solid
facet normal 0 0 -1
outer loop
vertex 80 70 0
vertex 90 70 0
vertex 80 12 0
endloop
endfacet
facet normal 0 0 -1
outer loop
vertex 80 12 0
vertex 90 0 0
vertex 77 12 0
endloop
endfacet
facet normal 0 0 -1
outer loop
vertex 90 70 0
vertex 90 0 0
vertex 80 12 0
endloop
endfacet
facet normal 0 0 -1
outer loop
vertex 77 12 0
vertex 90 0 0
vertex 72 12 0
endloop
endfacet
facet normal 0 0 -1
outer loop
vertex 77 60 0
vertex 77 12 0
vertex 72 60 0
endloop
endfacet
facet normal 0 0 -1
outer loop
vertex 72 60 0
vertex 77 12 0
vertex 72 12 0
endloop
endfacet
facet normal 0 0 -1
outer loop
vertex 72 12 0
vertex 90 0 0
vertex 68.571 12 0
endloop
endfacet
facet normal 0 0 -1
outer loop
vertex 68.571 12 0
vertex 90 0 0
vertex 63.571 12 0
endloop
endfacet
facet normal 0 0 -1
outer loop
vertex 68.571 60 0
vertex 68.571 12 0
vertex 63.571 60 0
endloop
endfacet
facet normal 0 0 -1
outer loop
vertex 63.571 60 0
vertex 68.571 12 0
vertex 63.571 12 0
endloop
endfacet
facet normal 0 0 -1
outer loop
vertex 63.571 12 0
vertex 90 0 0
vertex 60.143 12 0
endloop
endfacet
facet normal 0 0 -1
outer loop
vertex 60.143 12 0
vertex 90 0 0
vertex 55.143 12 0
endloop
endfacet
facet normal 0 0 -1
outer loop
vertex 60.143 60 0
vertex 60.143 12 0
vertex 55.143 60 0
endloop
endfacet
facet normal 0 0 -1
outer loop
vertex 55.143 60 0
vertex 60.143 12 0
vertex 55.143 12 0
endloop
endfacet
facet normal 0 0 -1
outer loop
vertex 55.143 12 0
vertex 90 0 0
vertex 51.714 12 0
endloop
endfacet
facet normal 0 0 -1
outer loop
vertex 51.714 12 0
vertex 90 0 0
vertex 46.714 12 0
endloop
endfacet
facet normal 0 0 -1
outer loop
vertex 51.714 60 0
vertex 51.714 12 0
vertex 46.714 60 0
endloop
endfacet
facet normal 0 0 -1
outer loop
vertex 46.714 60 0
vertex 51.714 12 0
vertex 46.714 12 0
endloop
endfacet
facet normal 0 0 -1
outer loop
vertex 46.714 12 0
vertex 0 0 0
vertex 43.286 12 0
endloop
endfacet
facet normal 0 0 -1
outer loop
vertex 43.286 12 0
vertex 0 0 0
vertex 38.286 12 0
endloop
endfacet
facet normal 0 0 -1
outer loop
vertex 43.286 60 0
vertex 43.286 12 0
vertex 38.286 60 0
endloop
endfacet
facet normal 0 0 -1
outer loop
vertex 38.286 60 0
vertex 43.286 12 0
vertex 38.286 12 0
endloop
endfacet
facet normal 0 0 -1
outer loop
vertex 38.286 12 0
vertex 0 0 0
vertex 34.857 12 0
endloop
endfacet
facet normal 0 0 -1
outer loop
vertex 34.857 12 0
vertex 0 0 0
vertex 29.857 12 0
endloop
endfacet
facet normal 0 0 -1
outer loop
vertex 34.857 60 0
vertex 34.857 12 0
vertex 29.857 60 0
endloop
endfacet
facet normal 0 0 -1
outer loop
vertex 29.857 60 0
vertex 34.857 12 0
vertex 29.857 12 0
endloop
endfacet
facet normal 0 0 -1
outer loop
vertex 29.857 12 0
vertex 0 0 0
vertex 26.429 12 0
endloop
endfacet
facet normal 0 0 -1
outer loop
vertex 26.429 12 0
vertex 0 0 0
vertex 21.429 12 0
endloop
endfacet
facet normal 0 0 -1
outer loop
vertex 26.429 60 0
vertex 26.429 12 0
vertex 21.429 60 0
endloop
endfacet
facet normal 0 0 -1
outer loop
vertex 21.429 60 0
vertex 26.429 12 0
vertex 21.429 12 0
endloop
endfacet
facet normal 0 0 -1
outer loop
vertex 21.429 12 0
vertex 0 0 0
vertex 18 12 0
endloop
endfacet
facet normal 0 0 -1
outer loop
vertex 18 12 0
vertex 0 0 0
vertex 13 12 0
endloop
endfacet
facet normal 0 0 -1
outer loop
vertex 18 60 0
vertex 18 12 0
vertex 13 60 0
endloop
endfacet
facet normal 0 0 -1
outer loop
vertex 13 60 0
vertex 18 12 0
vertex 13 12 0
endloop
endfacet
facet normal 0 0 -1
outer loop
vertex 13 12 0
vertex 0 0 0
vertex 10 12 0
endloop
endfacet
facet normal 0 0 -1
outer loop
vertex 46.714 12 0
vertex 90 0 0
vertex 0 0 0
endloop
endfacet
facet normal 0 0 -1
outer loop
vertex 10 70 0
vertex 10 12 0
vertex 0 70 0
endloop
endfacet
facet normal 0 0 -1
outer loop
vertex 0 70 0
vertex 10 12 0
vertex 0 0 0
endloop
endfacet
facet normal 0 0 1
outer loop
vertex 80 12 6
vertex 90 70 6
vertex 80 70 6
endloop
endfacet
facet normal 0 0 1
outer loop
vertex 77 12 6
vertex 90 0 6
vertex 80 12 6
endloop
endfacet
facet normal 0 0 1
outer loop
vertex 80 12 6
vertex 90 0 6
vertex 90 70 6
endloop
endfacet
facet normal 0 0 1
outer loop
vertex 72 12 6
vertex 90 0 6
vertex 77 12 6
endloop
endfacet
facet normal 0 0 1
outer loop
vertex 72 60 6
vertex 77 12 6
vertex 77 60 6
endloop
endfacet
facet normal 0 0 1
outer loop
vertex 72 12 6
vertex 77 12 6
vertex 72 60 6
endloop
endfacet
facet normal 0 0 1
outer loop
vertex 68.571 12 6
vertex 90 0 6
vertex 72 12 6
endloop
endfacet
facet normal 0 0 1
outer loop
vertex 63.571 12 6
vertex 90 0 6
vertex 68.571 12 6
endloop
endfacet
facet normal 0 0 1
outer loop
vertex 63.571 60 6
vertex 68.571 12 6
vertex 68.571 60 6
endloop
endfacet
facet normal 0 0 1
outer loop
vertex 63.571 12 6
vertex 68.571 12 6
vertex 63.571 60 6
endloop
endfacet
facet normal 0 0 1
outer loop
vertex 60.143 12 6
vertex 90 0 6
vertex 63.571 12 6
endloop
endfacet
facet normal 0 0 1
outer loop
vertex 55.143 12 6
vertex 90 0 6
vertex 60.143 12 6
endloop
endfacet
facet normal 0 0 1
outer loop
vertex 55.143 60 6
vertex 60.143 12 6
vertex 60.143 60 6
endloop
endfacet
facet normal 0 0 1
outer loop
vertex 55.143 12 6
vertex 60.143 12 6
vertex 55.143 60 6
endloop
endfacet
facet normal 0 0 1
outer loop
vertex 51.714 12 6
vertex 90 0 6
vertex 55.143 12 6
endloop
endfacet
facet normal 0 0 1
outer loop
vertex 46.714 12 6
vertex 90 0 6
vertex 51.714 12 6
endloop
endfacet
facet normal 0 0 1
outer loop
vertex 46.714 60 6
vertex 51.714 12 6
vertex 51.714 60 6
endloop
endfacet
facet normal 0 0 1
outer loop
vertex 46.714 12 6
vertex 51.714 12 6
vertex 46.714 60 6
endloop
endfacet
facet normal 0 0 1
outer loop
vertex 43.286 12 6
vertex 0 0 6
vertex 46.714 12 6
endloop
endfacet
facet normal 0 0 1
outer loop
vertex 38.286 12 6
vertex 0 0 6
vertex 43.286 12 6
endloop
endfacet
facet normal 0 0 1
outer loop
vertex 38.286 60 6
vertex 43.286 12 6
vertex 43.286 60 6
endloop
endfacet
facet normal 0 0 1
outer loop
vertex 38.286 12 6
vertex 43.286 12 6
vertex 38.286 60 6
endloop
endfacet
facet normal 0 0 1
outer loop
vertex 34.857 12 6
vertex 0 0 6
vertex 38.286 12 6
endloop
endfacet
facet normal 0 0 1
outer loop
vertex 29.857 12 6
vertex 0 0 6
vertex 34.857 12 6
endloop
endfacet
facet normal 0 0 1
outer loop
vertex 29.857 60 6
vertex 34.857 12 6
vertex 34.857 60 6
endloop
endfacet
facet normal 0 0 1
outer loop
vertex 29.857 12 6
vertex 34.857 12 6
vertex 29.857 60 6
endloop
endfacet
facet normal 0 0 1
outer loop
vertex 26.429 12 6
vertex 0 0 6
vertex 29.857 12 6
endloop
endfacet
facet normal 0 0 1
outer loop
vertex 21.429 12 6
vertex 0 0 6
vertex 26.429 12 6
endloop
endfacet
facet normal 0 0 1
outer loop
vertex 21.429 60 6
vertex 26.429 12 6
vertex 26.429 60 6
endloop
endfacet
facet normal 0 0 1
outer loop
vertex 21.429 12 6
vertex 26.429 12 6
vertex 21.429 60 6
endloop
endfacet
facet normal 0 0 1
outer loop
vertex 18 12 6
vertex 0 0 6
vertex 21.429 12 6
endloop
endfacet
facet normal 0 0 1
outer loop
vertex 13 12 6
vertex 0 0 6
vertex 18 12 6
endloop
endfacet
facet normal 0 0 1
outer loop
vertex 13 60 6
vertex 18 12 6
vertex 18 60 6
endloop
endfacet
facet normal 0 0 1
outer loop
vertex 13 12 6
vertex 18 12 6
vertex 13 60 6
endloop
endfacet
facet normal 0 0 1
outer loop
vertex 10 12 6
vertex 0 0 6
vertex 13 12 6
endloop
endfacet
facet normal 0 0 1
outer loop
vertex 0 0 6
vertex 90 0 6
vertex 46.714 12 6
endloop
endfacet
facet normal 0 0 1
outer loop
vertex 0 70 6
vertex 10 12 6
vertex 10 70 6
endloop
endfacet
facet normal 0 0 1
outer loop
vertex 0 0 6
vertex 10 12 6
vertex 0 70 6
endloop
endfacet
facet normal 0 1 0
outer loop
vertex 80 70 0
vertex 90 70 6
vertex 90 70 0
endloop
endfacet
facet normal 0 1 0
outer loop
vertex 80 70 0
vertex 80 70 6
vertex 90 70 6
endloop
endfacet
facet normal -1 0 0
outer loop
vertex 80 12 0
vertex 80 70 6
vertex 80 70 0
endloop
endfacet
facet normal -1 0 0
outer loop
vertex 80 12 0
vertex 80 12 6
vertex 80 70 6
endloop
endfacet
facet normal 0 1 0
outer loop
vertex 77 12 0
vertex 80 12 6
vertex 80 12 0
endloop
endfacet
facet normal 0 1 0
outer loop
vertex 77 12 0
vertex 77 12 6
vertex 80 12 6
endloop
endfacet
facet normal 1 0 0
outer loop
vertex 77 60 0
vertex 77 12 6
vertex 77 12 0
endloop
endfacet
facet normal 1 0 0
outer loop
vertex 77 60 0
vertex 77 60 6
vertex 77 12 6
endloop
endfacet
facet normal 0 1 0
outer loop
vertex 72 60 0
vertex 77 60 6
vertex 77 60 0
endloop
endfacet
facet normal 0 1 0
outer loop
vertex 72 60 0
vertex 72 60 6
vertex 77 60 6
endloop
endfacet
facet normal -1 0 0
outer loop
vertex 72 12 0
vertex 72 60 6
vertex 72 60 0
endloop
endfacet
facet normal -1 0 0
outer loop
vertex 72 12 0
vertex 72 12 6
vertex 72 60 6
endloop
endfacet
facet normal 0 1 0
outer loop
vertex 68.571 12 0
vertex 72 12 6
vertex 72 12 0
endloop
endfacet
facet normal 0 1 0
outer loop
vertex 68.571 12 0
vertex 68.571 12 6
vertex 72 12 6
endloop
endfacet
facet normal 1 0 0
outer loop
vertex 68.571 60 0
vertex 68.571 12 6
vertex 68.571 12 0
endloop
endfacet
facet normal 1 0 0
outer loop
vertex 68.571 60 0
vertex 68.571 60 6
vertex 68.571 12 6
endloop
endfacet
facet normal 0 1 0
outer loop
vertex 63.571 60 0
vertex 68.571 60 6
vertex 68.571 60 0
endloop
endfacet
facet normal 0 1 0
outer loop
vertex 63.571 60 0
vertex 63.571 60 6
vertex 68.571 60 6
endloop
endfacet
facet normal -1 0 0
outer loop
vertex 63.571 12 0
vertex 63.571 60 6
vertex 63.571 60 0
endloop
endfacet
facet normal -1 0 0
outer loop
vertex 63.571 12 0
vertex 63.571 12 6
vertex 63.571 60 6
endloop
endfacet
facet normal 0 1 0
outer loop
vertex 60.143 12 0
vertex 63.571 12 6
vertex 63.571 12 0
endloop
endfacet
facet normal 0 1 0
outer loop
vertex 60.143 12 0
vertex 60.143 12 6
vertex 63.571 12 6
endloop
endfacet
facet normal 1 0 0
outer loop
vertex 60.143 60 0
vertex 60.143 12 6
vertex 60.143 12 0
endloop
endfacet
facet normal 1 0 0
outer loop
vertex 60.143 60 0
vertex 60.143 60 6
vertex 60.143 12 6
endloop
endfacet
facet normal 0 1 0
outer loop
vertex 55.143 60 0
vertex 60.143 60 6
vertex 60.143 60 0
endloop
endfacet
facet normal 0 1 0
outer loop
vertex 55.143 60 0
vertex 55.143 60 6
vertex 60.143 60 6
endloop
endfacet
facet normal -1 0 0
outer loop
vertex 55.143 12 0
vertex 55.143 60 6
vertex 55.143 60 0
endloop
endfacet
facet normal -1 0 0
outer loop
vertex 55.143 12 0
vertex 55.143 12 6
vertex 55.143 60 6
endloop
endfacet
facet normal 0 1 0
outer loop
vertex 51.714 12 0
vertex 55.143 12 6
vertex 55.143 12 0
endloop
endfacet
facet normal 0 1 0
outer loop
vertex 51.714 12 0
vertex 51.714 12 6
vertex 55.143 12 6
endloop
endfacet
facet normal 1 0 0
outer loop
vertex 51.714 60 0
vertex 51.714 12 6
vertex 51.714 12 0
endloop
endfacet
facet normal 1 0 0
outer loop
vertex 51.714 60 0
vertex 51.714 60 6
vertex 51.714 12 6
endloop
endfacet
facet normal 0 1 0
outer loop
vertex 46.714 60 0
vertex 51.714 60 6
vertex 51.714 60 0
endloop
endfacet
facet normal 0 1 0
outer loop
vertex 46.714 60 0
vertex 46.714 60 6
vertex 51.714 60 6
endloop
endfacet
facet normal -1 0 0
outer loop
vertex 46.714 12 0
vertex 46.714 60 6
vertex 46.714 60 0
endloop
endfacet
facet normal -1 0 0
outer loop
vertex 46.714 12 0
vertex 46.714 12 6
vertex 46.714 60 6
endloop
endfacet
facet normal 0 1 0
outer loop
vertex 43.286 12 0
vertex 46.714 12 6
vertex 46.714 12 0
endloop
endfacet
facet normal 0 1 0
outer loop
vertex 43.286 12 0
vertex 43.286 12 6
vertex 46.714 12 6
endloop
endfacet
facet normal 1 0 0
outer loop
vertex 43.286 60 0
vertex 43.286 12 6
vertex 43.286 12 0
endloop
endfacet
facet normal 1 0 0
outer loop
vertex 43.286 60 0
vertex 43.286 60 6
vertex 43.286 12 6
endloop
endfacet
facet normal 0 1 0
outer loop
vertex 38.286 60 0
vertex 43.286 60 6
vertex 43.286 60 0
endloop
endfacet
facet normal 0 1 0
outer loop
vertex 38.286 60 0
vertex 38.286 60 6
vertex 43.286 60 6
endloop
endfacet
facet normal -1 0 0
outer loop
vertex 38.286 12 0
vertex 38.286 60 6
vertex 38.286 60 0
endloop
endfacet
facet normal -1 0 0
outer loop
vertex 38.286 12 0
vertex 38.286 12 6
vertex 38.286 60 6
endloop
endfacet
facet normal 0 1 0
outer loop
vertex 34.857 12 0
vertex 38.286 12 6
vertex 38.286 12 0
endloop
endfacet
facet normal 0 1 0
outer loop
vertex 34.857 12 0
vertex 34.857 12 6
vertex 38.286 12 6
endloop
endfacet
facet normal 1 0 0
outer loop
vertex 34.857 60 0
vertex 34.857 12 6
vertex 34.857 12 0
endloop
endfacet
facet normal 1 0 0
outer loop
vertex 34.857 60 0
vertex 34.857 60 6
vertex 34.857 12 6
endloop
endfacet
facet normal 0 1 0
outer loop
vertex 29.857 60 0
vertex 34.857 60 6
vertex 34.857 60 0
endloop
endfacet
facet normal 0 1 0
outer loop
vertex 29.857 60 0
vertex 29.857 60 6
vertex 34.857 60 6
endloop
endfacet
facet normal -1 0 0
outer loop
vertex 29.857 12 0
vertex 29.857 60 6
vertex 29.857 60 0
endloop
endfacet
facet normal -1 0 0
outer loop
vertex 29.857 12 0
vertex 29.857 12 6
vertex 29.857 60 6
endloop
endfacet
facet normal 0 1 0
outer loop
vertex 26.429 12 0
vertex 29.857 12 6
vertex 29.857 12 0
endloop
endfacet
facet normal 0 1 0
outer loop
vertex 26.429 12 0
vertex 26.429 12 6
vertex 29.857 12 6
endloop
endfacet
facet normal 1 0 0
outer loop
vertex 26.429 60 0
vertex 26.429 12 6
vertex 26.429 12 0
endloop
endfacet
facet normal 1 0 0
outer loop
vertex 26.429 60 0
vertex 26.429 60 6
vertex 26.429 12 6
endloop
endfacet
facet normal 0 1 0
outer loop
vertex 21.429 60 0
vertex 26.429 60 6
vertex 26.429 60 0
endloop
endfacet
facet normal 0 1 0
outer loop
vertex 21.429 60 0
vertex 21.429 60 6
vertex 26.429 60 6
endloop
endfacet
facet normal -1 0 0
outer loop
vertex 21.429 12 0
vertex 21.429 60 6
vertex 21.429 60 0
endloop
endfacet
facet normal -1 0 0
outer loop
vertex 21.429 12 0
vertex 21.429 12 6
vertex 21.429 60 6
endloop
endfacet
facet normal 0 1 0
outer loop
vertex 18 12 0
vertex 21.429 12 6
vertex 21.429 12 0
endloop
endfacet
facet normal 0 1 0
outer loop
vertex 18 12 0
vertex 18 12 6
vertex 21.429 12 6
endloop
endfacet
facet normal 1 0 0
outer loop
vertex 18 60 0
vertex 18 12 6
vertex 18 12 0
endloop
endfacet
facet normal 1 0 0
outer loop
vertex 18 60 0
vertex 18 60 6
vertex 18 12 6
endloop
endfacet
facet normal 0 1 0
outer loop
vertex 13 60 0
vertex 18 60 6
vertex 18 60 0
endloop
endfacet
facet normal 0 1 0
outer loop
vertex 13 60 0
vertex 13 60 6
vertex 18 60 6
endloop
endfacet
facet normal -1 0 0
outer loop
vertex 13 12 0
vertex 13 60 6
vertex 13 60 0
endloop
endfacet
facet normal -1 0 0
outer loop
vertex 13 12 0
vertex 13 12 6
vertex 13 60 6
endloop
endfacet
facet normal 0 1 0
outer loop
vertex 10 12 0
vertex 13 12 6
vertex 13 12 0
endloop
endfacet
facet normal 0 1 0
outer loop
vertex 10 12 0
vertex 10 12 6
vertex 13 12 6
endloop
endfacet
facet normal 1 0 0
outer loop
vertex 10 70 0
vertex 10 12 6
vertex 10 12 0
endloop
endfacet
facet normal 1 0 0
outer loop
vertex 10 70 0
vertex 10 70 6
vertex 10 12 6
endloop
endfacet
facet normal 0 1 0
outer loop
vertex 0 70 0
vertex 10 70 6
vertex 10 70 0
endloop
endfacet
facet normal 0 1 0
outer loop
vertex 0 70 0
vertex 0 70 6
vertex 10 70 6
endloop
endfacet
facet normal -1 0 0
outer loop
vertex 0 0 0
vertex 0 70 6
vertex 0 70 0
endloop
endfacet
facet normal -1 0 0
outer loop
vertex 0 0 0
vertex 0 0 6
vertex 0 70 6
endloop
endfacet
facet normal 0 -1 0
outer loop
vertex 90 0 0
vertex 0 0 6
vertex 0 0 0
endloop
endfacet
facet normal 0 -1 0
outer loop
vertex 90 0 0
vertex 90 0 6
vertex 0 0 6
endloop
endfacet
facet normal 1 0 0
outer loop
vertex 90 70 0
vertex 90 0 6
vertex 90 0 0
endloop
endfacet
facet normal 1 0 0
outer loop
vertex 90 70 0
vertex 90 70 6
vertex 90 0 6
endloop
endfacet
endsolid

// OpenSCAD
$fn = 32;

// ----------------------------------------------------------------------
// Guard grille: 8 slats over a 90 x 70 mm plate
// ----------------------------------------------------------------------

// --- parameters (mm) ---
profile_height = 6;       // extrusion height
profile_points = 40;      // points of the closed outline

profile = [[0, 0], [90, 0], [90, 70], [80, 70], [80, 12], [77, 12], [77, 60], [72, 60], [72, 12], [68.571, 12], [68.571, 60], [63.571, 60], [63.571, 12], [60.143, 12], [60.143, 60], [55.143, 60], [55.143, 12], [51.714, 12], [51.714, 60], [46.714, 60], [46.714, 12], [43.286, 12], [43.286, 60], [38.286, 60], [38.286, 12], [34.857, 12], [34.857, 60], [29.857, 60], [29.857, 12], [26.429, 12], [26.429, 60], [21.429, 60], [21.429, 12], [18, 12], [18, 60], [13, 60], [13, 12], [10, 12], [10, 70], [0, 70]];  // single closed polygon, 40 points, counter clockwise

// --- the one profile operation ---
linear_extrude(height = profile_height) polygon(points = profile);
